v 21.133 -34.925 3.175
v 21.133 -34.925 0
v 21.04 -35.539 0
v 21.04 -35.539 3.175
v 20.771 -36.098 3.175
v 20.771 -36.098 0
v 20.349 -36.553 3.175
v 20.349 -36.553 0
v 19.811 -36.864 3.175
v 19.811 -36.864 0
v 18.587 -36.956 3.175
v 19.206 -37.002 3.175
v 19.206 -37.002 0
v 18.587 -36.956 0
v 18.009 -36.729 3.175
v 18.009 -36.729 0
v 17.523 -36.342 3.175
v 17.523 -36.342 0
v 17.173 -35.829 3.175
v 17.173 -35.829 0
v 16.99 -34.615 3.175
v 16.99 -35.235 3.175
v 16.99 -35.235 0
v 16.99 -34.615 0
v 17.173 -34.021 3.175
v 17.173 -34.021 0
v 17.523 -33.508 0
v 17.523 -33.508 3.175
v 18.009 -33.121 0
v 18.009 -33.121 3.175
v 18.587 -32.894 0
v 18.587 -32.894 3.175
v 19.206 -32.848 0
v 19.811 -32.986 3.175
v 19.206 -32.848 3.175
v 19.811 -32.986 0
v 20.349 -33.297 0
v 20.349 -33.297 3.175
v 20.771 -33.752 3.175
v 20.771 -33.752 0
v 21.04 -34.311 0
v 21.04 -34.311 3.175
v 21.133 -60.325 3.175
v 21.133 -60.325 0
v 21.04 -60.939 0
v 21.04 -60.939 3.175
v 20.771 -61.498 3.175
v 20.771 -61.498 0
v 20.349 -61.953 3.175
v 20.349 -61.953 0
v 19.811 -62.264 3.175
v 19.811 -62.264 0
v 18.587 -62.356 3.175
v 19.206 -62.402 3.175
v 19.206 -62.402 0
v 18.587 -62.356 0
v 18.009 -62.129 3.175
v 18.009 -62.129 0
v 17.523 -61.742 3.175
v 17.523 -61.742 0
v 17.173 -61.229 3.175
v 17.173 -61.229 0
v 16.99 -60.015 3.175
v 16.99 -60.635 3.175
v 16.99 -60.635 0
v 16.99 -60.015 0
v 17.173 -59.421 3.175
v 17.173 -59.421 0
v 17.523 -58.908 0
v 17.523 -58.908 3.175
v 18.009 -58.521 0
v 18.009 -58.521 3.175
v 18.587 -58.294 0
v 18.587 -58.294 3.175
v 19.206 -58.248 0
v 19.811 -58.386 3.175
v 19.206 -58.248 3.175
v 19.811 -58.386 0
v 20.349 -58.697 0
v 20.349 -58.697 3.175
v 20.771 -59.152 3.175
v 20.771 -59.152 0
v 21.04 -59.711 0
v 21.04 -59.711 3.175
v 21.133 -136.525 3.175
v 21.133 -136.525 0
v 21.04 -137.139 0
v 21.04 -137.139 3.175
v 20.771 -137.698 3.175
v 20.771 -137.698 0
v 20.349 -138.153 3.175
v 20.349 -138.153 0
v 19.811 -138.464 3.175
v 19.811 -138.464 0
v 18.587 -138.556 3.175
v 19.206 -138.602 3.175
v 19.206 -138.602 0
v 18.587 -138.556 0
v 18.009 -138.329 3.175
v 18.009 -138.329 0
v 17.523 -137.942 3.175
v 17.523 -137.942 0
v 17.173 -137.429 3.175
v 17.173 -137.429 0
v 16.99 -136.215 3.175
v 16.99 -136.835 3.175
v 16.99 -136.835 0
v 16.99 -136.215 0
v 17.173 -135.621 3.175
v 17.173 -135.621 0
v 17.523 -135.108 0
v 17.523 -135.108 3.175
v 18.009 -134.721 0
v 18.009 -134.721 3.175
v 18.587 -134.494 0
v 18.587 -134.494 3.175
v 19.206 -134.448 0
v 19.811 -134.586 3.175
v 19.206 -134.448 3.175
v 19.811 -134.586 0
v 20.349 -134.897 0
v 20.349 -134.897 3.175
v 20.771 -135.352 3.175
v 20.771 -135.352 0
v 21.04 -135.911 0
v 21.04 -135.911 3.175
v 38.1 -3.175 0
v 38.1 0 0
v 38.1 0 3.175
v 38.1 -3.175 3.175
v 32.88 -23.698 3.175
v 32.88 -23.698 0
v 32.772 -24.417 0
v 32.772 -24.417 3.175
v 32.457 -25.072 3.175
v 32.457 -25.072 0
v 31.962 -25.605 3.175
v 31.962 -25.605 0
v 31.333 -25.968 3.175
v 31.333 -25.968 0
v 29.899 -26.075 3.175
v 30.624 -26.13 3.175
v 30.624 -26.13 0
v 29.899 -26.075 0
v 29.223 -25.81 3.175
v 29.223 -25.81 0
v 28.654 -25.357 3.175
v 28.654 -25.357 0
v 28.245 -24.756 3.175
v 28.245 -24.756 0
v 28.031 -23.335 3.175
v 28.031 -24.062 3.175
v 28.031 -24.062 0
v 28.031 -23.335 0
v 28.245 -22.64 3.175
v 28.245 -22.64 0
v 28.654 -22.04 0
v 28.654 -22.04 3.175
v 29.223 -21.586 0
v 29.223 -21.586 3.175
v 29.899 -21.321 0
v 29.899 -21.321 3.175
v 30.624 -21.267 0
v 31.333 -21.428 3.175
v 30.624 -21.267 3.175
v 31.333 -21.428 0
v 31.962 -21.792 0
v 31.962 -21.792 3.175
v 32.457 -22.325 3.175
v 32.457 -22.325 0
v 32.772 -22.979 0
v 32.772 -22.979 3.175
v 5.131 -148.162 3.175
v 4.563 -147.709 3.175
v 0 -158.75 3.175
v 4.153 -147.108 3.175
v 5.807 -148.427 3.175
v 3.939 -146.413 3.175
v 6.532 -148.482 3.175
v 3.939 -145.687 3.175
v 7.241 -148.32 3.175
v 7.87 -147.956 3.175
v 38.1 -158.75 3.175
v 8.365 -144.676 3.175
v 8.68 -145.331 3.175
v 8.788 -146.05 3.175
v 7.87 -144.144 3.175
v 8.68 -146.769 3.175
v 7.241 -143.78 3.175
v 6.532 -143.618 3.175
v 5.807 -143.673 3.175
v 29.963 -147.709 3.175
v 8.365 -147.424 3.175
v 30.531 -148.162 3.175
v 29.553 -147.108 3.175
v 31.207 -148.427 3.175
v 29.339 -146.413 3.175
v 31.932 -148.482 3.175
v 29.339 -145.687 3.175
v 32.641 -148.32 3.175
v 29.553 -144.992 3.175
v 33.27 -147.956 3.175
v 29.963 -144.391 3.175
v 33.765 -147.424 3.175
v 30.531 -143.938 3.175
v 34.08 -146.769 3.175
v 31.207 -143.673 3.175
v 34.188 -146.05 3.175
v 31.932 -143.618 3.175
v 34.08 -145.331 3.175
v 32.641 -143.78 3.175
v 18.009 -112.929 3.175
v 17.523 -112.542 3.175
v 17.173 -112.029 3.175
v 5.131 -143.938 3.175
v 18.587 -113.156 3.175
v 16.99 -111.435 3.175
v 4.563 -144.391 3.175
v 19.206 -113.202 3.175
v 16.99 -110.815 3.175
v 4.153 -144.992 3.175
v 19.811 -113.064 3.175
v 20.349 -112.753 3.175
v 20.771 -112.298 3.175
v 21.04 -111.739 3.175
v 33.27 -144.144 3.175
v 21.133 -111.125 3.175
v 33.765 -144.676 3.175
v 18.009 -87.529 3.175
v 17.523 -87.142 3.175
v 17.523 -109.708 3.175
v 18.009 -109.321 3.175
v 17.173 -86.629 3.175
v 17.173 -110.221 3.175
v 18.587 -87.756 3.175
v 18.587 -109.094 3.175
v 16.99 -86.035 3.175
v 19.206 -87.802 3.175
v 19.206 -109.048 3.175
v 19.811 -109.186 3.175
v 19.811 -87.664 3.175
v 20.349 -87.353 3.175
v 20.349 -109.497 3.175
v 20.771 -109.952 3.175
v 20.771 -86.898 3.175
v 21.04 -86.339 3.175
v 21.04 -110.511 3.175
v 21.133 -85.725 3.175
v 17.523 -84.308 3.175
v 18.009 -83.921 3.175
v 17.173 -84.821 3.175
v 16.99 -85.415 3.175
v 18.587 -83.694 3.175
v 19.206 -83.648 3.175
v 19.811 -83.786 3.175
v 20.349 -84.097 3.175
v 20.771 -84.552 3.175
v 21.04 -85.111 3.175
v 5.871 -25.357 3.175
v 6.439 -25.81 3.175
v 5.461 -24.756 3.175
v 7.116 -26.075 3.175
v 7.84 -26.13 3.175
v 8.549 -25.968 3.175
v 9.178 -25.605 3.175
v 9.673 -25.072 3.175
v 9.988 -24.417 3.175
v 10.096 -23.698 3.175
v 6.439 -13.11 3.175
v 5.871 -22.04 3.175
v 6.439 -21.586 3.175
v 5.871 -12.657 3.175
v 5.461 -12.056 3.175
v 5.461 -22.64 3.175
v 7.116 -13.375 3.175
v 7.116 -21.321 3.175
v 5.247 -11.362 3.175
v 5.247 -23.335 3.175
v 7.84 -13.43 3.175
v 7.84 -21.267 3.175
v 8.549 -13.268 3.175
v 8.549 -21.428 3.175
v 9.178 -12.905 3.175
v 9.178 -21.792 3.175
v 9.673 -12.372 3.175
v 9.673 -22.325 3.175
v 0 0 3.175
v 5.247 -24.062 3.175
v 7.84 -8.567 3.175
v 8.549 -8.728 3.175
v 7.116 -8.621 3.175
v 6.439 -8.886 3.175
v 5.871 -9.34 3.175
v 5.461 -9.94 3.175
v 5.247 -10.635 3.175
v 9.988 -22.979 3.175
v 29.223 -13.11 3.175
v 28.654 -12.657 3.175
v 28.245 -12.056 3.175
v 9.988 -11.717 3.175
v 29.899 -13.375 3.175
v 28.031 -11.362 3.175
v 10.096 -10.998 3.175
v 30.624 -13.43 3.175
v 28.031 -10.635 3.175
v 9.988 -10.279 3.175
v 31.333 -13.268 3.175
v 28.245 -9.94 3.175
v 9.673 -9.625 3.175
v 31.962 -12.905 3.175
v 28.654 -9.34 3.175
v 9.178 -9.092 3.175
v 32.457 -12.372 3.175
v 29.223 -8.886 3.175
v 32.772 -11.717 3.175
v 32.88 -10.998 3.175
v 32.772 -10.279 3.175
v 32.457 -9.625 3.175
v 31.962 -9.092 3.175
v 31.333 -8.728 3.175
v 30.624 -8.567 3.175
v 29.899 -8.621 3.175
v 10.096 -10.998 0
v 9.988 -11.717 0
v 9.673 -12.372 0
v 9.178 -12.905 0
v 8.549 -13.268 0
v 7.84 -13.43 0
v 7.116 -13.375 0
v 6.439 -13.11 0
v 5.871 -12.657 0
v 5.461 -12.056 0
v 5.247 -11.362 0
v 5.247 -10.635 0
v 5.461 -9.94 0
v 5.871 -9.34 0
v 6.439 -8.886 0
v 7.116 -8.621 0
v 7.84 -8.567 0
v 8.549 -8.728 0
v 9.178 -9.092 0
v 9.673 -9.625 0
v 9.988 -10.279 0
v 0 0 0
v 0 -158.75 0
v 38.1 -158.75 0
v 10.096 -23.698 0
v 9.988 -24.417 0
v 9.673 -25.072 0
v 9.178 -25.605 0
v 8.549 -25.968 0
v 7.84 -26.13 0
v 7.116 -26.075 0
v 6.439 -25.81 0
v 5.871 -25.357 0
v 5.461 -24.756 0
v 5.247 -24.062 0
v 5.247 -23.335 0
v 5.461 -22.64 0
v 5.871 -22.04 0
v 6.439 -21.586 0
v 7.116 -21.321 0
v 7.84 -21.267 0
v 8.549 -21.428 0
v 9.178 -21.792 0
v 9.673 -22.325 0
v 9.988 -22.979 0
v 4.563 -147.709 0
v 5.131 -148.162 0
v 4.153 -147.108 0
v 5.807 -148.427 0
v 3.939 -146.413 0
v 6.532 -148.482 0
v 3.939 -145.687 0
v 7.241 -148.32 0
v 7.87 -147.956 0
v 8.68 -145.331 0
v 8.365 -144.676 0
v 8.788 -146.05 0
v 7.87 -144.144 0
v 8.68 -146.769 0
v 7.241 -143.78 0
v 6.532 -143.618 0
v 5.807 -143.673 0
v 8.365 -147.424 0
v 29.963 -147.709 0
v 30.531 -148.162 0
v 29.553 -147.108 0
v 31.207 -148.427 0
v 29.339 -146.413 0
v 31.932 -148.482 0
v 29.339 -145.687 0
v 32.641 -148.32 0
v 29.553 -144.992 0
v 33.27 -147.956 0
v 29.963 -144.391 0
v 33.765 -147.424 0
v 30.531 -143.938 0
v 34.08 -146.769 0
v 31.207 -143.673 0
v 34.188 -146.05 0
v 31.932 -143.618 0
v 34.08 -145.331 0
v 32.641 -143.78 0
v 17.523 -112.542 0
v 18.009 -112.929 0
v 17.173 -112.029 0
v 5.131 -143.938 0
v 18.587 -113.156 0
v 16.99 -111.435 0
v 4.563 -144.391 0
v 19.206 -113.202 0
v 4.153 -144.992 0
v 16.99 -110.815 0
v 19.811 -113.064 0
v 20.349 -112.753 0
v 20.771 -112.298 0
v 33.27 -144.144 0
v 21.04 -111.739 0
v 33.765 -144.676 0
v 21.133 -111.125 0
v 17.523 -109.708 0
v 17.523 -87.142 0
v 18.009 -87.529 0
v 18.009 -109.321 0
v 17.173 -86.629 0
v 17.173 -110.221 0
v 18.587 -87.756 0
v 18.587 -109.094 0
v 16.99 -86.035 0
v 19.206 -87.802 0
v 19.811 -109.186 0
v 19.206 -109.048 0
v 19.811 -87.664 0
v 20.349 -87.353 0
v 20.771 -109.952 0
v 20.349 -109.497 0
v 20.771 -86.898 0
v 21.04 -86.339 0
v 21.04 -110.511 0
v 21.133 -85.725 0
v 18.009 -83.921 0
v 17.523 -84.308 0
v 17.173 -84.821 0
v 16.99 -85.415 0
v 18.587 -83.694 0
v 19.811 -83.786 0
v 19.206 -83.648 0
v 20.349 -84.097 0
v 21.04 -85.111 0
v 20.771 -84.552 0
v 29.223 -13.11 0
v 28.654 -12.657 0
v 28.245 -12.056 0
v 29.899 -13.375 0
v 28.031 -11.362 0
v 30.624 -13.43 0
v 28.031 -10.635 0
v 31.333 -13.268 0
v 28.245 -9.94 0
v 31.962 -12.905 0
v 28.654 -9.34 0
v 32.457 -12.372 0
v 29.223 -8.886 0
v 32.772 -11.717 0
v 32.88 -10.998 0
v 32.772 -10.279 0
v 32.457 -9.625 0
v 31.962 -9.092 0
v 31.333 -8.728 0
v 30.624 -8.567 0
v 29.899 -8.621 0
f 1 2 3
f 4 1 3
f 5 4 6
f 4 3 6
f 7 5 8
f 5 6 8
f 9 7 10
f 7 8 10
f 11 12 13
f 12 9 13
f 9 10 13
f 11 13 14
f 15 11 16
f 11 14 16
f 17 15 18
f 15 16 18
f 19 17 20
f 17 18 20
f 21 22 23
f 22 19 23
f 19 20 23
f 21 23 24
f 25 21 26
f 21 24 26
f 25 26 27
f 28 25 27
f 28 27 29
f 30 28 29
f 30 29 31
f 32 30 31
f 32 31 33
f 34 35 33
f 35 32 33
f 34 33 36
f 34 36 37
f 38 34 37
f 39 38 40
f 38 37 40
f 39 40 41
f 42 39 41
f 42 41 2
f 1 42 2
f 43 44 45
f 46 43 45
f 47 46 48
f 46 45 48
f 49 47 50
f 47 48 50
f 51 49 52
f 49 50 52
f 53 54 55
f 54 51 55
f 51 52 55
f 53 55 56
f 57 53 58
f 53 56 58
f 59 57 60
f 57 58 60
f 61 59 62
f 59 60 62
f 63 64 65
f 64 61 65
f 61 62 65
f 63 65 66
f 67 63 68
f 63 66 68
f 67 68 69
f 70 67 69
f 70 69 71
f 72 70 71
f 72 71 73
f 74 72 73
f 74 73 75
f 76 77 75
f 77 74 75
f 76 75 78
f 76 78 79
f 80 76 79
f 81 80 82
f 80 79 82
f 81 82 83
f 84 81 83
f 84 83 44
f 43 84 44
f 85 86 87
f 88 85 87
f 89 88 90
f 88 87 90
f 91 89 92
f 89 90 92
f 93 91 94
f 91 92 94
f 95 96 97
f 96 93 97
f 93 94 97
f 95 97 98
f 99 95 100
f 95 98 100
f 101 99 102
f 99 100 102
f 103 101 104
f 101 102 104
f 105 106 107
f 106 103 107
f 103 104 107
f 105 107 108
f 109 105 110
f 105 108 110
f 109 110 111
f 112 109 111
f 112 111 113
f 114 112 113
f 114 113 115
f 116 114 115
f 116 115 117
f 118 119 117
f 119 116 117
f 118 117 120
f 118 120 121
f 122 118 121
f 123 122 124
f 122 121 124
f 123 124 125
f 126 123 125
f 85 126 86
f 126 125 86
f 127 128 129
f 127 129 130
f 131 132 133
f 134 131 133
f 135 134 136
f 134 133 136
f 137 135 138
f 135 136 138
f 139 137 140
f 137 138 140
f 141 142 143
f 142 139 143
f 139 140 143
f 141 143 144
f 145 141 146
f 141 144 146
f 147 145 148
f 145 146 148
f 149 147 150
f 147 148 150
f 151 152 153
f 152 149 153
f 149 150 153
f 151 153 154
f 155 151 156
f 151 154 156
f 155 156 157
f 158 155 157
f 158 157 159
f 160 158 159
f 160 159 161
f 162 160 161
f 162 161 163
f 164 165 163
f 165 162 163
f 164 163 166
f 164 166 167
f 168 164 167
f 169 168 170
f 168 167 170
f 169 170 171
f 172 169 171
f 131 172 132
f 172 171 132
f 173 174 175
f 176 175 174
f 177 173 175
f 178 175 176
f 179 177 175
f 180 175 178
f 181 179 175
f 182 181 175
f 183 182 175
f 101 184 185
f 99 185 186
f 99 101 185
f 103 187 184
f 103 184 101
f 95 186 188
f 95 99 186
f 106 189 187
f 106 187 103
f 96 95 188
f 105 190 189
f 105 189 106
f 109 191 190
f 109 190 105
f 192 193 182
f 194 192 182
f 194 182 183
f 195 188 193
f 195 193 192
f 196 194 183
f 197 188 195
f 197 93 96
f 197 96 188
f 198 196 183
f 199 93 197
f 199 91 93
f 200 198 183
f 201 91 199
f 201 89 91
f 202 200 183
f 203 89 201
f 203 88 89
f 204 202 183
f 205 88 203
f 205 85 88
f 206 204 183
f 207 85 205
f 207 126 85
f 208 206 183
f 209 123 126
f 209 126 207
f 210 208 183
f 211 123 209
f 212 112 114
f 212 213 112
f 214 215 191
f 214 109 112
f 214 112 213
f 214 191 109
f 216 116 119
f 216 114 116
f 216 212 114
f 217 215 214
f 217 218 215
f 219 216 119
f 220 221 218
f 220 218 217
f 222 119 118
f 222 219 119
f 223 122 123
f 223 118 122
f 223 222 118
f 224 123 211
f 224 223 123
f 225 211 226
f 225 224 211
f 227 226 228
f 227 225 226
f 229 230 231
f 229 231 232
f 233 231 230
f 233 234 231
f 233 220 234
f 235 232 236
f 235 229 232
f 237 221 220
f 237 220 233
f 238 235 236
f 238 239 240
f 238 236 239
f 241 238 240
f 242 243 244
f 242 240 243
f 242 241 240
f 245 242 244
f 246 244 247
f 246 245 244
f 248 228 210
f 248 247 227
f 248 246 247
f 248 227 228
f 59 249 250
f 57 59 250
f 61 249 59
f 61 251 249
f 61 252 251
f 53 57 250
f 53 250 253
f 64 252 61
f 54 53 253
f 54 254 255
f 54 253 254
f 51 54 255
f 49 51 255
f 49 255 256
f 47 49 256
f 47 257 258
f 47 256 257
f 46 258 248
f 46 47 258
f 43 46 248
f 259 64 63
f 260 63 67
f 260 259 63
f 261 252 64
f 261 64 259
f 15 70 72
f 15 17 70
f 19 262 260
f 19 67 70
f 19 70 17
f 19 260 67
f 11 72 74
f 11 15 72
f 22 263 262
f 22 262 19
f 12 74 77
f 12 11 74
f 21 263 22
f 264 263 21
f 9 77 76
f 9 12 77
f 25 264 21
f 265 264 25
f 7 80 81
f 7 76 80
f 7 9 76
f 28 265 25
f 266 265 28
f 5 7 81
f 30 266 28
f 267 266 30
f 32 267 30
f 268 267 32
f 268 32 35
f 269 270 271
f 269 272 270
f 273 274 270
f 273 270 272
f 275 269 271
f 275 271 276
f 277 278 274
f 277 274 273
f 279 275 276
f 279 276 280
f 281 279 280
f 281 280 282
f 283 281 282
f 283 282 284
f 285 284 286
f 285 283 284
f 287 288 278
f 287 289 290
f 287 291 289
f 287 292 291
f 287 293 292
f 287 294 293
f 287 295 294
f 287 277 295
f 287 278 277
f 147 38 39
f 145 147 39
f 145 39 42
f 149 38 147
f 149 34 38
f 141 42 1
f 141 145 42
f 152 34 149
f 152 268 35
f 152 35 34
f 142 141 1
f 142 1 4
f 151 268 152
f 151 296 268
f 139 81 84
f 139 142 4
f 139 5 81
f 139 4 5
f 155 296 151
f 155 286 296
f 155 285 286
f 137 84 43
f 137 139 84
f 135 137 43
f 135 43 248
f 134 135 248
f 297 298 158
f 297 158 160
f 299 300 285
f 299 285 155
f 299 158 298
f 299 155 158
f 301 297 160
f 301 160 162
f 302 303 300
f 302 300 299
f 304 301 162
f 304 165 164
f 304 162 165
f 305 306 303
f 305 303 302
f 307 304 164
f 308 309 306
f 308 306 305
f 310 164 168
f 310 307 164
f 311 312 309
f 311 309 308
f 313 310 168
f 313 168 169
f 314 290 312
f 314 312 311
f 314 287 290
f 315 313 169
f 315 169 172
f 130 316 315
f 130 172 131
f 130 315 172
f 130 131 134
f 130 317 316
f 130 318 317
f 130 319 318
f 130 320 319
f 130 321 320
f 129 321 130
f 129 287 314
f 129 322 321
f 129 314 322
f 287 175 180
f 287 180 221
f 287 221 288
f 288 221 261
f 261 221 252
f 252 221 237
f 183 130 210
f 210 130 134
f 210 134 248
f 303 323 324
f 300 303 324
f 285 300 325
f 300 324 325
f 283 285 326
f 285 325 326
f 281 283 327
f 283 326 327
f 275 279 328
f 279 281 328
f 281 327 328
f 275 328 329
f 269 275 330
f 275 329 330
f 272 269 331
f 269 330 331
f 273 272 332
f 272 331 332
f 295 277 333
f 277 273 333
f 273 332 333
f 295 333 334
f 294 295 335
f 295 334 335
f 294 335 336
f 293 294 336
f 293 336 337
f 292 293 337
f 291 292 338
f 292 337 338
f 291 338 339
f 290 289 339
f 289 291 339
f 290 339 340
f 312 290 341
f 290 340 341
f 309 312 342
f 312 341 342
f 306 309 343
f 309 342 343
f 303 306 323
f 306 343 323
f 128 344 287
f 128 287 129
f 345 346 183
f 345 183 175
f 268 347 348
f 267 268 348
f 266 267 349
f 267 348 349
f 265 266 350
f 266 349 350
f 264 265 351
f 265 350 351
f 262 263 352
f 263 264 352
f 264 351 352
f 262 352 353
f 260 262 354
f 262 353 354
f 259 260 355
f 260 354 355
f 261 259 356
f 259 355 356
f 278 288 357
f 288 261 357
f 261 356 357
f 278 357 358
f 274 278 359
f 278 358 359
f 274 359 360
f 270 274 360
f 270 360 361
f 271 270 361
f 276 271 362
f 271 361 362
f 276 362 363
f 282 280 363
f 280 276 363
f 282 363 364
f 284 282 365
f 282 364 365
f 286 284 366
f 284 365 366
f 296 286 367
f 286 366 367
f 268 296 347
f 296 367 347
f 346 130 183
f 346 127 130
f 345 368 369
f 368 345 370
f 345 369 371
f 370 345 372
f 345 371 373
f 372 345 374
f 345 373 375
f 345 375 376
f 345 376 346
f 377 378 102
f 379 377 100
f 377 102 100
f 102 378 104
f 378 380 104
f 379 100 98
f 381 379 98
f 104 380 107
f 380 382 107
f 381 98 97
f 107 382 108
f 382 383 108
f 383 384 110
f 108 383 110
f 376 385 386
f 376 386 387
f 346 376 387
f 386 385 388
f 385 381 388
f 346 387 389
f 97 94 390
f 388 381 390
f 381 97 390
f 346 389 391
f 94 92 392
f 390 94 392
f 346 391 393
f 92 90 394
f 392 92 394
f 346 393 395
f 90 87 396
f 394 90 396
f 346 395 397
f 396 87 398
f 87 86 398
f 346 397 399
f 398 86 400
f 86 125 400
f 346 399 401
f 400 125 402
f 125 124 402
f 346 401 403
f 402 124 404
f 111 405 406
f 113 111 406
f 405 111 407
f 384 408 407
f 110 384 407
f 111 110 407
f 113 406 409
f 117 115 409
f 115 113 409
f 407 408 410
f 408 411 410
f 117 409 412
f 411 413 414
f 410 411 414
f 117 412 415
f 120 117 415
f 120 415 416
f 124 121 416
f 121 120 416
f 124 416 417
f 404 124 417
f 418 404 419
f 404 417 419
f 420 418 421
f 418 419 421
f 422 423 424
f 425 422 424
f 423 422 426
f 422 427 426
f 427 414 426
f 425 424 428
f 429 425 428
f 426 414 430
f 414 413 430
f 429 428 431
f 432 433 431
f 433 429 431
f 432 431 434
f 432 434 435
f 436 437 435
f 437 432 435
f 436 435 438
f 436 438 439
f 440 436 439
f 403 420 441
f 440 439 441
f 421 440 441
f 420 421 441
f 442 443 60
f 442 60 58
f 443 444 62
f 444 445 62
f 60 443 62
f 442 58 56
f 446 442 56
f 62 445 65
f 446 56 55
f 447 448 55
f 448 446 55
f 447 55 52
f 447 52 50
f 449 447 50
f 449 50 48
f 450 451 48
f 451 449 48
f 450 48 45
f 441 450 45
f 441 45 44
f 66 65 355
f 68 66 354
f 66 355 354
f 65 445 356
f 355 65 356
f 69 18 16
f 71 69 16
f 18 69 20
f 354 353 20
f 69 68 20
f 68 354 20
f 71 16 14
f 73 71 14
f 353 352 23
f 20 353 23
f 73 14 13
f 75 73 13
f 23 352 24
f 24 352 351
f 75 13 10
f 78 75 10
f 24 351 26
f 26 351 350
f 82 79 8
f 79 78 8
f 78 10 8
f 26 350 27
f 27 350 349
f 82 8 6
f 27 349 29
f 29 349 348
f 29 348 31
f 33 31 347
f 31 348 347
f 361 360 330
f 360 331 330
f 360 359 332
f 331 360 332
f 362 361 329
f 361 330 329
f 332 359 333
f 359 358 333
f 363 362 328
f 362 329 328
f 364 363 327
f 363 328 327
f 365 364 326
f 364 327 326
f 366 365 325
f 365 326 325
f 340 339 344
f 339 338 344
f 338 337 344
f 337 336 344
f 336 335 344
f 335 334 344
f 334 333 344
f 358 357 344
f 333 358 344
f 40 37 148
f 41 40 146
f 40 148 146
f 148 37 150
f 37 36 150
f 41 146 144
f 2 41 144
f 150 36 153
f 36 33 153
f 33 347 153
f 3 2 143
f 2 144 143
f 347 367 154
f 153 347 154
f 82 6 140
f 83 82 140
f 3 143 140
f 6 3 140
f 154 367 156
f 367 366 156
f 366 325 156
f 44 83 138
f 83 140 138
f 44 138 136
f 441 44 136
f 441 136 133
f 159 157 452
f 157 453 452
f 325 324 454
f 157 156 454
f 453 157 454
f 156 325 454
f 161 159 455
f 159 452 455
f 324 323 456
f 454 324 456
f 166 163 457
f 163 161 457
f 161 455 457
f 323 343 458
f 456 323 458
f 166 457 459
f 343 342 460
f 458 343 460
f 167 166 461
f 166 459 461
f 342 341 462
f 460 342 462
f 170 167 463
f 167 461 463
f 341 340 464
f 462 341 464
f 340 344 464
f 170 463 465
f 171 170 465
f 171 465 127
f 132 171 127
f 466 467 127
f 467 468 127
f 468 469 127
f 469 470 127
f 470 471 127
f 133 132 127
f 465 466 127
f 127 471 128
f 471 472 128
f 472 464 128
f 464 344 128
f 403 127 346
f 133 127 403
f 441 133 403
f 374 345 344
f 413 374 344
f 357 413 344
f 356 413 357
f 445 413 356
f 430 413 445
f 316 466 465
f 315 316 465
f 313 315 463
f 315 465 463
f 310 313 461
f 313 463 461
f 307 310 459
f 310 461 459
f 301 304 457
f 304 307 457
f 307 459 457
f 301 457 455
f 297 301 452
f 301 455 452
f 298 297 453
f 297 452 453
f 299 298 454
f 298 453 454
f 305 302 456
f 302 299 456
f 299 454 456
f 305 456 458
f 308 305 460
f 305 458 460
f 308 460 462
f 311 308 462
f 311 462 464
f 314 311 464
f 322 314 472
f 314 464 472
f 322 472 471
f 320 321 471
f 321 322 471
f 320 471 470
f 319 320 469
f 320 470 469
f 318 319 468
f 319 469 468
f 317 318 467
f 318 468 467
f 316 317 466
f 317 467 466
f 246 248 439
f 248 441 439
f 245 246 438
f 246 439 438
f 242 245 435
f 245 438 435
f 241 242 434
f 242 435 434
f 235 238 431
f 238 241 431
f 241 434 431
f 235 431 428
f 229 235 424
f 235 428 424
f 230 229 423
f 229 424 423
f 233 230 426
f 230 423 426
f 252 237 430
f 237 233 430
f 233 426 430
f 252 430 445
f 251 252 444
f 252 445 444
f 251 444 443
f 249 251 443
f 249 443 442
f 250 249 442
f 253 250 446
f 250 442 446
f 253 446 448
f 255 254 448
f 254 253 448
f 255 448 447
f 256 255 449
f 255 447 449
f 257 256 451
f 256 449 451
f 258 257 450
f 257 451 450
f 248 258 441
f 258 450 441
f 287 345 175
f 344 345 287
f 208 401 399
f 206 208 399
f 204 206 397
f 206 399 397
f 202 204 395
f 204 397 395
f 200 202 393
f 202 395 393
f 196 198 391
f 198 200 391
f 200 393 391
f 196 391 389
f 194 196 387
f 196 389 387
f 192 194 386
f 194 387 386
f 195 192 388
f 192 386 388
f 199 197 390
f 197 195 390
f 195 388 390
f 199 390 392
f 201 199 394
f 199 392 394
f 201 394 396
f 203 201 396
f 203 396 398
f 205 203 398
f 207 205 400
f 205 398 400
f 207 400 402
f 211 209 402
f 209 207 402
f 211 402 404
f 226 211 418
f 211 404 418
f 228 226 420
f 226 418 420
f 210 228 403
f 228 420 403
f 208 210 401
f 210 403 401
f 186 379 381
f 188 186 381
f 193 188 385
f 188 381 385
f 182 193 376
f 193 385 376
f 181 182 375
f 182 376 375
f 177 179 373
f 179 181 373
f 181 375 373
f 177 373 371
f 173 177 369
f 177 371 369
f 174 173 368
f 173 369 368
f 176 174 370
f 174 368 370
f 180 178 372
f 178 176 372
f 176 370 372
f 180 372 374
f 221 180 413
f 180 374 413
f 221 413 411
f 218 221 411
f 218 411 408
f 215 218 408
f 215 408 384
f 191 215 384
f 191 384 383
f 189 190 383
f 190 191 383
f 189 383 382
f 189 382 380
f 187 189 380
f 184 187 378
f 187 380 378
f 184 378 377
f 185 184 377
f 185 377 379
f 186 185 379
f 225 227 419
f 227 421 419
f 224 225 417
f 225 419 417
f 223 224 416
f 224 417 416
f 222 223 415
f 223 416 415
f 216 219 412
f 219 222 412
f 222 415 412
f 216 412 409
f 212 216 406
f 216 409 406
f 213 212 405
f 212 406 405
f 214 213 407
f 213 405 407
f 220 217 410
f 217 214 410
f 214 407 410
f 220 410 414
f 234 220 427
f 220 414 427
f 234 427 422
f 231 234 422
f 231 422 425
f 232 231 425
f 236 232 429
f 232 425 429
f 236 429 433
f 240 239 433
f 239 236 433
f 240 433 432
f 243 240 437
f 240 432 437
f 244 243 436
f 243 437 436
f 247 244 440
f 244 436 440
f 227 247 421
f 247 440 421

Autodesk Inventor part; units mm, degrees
ref_plane "YZ Plane" through (0, 0, 0) normal (1, 0, 0) x (0, 1, 0)
ref_plane "XZ Plane" through (0, 0, 0) normal (0, 1, 0) x (-1, 0, 0)
ref_plane "XY Plane" through (0, 0, 0) normal (0, 0, 1) x (1, 0, 0)
sketch "Sketch1" plane through (0, 0, 0) normal (0, 0, 1) x (1, 0, 0)
  line L0 (38.1, 0) -> (38.1, -3.175)
  line L1 (0, 0) -> (38.1, 0)
  line L2 (38.1, 0) -> (38.1, -158.75)
  line L3 (38.1, -158.75) -> (0, -158.75)
  line L4 (0, -158.75) -> (0, 0)
  circle A0 centre (6.35, -146.05) radius 2.4384
  line L5 (19.05, -158.75) -> (19.05, 0) construction
  circle A1 centre (31.75, -146.05) radius 2.4384
  circle A2 centre (7.6581, -23.6982) radius 2.4384
  circle A3 centre (7.6581, -10.9982) radius 2.4384
  circle A4 centre (30.4419, -10.9982) radius 2.4384
  circle A5 centre (30.4419, -23.6982) radius 2.4384
  line L6 (7.6581, -10.9982) -> (7.6581, -23.6982) construction
  line L7 (31.75, -136.525) -> (6.35, -136.525) construction
  line L8 (6.35, -136.525) -> (6.35, -34.925) construction
  line L9 (6.35, -34.925) -> (31.75, -34.925) construction
  line L10 (31.75, -34.925) -> (31.75, -136.525) construction
  circle A6 centre (19.05, -34.925) radius 2.0828
  circle A7 centre (19.05, -60.325) radius 2.0828
  circle A8 centre (19.05, -85.725) radius 2.0828
  circle A9 centre (19.05, -111.125) radius 2.0828
  circle A10 centre (19.05, -136.525) radius 2.0828
  dimension "d0" = 4.8768
  dimension "d1" = 158.75
  dimension "d2" = 12.7
  dimension "d3" = 12.7
  dimension "d4" = 12.7
  dimension "d5" = 11.3919
  dimension "d6" = 122.3518
  dimension "d7" = 38.1
  dimension "d8" = 25.4
  dimension "d9" = 34.925
  dimension "d10" = 101.6
  dimension "d11" = 4.1656
  dimension "d14" = 25.4
extrude "Extrusion1" add sketch "Sketch1" along normal blind 3.175
properties part number "Support for 9-16 Piston"
